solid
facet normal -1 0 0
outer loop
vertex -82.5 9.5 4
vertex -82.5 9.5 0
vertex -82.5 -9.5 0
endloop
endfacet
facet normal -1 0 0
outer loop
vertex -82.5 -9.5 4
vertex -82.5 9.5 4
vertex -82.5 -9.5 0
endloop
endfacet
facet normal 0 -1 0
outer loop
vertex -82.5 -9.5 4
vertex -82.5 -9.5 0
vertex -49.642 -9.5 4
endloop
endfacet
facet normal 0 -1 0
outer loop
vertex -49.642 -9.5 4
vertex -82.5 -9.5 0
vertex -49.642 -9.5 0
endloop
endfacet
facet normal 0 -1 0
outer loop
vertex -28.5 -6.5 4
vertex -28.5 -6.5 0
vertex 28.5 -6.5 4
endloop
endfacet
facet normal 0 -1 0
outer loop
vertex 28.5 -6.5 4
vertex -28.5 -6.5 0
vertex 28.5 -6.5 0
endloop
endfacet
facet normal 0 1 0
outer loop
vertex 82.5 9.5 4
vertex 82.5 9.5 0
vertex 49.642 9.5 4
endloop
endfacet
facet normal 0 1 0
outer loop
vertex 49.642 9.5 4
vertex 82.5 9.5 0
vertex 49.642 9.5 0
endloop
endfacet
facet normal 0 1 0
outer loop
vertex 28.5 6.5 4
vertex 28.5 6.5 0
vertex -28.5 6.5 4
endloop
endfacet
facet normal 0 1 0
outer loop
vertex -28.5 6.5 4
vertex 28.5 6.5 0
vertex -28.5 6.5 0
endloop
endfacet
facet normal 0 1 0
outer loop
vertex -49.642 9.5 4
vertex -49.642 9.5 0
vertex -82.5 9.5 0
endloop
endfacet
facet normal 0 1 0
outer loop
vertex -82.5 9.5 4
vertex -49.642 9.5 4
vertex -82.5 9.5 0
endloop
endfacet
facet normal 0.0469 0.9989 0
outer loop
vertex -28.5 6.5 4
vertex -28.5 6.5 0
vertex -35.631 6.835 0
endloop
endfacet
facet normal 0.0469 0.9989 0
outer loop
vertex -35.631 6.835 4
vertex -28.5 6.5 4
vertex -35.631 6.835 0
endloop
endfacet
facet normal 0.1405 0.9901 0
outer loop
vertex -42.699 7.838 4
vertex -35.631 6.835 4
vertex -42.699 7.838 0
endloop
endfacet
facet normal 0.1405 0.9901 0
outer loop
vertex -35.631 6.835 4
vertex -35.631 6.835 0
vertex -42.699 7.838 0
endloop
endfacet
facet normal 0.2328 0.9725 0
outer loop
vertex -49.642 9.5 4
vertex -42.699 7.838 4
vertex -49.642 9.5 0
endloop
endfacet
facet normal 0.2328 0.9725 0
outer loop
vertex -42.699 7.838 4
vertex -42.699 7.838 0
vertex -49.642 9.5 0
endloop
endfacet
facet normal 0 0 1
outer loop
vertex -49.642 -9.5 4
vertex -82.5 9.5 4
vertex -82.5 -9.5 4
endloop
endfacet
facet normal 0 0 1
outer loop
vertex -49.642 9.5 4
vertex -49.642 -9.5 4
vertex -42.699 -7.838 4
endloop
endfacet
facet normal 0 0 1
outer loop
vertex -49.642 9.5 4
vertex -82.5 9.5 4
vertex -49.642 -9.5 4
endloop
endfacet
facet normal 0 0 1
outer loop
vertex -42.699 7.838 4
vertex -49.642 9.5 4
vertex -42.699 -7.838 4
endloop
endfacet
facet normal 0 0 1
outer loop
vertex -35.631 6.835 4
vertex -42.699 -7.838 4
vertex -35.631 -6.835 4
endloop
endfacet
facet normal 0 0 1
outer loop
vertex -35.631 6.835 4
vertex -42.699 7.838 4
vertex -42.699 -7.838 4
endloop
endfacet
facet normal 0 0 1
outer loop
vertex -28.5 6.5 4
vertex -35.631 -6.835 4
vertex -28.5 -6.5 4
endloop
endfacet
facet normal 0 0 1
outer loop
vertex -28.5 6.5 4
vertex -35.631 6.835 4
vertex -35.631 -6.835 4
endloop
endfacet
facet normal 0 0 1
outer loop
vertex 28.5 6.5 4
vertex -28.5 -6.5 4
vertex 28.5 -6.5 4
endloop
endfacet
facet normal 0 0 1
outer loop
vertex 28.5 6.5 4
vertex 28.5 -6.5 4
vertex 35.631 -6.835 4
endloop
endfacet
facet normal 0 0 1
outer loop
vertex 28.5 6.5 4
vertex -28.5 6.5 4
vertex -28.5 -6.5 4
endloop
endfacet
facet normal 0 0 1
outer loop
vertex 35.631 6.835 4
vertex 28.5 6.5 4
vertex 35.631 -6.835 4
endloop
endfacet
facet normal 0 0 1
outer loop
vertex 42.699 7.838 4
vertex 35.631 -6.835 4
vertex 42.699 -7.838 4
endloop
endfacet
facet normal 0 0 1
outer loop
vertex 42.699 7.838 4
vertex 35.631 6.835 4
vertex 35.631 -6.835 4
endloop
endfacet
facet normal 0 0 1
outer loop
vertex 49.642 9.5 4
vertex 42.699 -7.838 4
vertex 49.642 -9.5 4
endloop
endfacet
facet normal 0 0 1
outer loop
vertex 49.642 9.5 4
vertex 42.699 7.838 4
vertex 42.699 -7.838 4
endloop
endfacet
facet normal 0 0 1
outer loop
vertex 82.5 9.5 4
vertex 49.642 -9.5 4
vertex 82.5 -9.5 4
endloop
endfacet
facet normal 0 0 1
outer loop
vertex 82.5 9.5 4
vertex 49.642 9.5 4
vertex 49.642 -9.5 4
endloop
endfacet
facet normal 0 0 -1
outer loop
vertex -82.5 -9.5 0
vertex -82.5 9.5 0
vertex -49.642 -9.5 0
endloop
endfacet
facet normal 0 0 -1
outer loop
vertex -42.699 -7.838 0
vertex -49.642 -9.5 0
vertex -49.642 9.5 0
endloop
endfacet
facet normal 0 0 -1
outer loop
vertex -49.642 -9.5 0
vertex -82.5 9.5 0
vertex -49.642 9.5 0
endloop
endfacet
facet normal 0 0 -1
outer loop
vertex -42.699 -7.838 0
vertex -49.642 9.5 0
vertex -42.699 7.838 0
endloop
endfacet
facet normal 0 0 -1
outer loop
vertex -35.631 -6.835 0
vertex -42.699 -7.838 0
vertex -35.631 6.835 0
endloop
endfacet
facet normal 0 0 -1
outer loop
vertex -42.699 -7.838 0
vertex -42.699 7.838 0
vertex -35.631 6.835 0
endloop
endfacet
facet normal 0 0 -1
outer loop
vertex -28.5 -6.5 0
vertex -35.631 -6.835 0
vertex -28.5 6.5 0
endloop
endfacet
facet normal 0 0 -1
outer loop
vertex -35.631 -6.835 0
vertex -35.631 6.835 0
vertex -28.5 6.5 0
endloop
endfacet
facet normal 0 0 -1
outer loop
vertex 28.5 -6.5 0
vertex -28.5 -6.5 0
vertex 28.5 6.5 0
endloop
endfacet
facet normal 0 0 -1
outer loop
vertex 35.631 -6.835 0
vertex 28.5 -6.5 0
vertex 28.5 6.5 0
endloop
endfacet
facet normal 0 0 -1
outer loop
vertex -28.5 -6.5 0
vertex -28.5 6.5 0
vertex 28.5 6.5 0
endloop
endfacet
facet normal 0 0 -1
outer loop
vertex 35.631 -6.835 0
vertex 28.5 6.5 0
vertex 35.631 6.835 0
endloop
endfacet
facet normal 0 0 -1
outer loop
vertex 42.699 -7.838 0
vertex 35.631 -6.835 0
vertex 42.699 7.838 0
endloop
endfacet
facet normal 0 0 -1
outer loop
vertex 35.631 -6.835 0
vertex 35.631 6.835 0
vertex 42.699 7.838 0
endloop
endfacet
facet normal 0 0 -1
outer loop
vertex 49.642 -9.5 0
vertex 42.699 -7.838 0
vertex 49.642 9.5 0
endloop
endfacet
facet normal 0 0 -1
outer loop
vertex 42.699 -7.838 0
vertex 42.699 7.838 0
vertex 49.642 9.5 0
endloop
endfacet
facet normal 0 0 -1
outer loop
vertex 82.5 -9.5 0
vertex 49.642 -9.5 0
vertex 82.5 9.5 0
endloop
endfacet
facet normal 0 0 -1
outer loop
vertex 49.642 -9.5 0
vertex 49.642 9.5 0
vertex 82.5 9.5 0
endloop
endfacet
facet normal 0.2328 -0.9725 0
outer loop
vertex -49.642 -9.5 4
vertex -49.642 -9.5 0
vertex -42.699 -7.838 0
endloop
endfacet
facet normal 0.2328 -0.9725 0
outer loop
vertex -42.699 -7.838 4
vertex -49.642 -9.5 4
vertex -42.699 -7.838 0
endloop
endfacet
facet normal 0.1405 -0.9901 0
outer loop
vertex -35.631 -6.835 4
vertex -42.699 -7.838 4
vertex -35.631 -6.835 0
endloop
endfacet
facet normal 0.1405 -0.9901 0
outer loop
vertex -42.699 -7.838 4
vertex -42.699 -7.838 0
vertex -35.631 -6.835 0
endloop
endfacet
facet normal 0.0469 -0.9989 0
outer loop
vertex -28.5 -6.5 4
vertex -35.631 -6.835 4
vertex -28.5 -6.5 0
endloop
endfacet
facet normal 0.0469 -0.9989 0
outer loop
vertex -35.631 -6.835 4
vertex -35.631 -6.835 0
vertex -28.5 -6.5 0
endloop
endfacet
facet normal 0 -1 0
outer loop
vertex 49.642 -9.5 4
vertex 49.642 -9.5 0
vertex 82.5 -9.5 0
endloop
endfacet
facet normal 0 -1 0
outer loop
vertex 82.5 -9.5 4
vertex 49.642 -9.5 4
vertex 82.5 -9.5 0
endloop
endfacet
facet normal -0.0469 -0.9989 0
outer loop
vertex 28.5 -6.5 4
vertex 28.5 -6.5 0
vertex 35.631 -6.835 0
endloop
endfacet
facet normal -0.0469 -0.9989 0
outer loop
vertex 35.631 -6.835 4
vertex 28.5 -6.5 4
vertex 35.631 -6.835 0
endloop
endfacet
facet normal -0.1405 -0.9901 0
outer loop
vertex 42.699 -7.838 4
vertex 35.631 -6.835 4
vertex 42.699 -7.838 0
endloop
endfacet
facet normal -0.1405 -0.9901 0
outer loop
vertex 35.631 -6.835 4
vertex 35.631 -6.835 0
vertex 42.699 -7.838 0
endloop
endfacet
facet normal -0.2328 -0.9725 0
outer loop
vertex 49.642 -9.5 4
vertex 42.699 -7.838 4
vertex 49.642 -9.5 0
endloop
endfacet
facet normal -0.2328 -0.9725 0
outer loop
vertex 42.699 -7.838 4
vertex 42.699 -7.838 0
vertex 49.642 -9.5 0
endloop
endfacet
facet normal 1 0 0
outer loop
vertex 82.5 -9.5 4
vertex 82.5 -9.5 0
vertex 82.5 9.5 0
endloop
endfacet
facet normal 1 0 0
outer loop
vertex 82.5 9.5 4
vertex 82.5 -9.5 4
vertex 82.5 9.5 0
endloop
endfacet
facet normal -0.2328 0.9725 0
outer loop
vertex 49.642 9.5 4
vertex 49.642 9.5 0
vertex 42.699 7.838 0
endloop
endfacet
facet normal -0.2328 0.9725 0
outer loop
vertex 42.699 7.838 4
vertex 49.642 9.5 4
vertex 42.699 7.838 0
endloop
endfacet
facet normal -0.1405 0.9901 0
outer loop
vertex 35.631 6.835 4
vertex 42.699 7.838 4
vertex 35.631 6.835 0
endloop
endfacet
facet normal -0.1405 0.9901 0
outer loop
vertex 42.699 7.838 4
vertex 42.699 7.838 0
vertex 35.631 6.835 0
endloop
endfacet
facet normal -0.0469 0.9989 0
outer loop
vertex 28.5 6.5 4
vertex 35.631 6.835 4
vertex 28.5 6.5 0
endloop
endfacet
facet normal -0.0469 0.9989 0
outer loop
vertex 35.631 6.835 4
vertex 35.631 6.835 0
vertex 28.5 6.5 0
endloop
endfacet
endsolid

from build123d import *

# Parameters (mm, degrees)
F1_DEPTH = 4


with BuildPart() as f1:
    # F0 (on Top) → F1 (new body)
    with BuildSketch(Plane.XY):
        with BuildLine():
            Line((28.5, 6.5), (-28.5, 6.5))
            ThreePointArc((-28.5, 6.5), (-39.177078, 7.253738), (-49.642375, 9.5))
            Line((-49.642375, 9.5), (-82.5, 9.5))
            Line((-82.5, 9.5), (-82.5, -9.5))
            Line((-82.5, -9.5), (-49.642375, -9.5))
            ThreePointArc((-49.642375, -9.5), (-39.177078, -7.253738), (-28.5, -6.5))
            Line((-28.5, -6.5), (28.5, -6.5))
            ThreePointArc((28.5, -6.5), (39.177078, -7.253738), (49.642375, -9.5))
            Line((49.642375, -9.5), (82.5, -9.5))
            Line((82.5, -9.5), (82.5, 9.5))
            Line((82.5, 9.5), (49.642375, 9.5))
            ThreePointArc((49.642375, 9.5), (39.177078, 7.253738), (28.5, 6.5))
        make_face()
    extrude(amount=F1_DEPTH)


solid = f1.part
